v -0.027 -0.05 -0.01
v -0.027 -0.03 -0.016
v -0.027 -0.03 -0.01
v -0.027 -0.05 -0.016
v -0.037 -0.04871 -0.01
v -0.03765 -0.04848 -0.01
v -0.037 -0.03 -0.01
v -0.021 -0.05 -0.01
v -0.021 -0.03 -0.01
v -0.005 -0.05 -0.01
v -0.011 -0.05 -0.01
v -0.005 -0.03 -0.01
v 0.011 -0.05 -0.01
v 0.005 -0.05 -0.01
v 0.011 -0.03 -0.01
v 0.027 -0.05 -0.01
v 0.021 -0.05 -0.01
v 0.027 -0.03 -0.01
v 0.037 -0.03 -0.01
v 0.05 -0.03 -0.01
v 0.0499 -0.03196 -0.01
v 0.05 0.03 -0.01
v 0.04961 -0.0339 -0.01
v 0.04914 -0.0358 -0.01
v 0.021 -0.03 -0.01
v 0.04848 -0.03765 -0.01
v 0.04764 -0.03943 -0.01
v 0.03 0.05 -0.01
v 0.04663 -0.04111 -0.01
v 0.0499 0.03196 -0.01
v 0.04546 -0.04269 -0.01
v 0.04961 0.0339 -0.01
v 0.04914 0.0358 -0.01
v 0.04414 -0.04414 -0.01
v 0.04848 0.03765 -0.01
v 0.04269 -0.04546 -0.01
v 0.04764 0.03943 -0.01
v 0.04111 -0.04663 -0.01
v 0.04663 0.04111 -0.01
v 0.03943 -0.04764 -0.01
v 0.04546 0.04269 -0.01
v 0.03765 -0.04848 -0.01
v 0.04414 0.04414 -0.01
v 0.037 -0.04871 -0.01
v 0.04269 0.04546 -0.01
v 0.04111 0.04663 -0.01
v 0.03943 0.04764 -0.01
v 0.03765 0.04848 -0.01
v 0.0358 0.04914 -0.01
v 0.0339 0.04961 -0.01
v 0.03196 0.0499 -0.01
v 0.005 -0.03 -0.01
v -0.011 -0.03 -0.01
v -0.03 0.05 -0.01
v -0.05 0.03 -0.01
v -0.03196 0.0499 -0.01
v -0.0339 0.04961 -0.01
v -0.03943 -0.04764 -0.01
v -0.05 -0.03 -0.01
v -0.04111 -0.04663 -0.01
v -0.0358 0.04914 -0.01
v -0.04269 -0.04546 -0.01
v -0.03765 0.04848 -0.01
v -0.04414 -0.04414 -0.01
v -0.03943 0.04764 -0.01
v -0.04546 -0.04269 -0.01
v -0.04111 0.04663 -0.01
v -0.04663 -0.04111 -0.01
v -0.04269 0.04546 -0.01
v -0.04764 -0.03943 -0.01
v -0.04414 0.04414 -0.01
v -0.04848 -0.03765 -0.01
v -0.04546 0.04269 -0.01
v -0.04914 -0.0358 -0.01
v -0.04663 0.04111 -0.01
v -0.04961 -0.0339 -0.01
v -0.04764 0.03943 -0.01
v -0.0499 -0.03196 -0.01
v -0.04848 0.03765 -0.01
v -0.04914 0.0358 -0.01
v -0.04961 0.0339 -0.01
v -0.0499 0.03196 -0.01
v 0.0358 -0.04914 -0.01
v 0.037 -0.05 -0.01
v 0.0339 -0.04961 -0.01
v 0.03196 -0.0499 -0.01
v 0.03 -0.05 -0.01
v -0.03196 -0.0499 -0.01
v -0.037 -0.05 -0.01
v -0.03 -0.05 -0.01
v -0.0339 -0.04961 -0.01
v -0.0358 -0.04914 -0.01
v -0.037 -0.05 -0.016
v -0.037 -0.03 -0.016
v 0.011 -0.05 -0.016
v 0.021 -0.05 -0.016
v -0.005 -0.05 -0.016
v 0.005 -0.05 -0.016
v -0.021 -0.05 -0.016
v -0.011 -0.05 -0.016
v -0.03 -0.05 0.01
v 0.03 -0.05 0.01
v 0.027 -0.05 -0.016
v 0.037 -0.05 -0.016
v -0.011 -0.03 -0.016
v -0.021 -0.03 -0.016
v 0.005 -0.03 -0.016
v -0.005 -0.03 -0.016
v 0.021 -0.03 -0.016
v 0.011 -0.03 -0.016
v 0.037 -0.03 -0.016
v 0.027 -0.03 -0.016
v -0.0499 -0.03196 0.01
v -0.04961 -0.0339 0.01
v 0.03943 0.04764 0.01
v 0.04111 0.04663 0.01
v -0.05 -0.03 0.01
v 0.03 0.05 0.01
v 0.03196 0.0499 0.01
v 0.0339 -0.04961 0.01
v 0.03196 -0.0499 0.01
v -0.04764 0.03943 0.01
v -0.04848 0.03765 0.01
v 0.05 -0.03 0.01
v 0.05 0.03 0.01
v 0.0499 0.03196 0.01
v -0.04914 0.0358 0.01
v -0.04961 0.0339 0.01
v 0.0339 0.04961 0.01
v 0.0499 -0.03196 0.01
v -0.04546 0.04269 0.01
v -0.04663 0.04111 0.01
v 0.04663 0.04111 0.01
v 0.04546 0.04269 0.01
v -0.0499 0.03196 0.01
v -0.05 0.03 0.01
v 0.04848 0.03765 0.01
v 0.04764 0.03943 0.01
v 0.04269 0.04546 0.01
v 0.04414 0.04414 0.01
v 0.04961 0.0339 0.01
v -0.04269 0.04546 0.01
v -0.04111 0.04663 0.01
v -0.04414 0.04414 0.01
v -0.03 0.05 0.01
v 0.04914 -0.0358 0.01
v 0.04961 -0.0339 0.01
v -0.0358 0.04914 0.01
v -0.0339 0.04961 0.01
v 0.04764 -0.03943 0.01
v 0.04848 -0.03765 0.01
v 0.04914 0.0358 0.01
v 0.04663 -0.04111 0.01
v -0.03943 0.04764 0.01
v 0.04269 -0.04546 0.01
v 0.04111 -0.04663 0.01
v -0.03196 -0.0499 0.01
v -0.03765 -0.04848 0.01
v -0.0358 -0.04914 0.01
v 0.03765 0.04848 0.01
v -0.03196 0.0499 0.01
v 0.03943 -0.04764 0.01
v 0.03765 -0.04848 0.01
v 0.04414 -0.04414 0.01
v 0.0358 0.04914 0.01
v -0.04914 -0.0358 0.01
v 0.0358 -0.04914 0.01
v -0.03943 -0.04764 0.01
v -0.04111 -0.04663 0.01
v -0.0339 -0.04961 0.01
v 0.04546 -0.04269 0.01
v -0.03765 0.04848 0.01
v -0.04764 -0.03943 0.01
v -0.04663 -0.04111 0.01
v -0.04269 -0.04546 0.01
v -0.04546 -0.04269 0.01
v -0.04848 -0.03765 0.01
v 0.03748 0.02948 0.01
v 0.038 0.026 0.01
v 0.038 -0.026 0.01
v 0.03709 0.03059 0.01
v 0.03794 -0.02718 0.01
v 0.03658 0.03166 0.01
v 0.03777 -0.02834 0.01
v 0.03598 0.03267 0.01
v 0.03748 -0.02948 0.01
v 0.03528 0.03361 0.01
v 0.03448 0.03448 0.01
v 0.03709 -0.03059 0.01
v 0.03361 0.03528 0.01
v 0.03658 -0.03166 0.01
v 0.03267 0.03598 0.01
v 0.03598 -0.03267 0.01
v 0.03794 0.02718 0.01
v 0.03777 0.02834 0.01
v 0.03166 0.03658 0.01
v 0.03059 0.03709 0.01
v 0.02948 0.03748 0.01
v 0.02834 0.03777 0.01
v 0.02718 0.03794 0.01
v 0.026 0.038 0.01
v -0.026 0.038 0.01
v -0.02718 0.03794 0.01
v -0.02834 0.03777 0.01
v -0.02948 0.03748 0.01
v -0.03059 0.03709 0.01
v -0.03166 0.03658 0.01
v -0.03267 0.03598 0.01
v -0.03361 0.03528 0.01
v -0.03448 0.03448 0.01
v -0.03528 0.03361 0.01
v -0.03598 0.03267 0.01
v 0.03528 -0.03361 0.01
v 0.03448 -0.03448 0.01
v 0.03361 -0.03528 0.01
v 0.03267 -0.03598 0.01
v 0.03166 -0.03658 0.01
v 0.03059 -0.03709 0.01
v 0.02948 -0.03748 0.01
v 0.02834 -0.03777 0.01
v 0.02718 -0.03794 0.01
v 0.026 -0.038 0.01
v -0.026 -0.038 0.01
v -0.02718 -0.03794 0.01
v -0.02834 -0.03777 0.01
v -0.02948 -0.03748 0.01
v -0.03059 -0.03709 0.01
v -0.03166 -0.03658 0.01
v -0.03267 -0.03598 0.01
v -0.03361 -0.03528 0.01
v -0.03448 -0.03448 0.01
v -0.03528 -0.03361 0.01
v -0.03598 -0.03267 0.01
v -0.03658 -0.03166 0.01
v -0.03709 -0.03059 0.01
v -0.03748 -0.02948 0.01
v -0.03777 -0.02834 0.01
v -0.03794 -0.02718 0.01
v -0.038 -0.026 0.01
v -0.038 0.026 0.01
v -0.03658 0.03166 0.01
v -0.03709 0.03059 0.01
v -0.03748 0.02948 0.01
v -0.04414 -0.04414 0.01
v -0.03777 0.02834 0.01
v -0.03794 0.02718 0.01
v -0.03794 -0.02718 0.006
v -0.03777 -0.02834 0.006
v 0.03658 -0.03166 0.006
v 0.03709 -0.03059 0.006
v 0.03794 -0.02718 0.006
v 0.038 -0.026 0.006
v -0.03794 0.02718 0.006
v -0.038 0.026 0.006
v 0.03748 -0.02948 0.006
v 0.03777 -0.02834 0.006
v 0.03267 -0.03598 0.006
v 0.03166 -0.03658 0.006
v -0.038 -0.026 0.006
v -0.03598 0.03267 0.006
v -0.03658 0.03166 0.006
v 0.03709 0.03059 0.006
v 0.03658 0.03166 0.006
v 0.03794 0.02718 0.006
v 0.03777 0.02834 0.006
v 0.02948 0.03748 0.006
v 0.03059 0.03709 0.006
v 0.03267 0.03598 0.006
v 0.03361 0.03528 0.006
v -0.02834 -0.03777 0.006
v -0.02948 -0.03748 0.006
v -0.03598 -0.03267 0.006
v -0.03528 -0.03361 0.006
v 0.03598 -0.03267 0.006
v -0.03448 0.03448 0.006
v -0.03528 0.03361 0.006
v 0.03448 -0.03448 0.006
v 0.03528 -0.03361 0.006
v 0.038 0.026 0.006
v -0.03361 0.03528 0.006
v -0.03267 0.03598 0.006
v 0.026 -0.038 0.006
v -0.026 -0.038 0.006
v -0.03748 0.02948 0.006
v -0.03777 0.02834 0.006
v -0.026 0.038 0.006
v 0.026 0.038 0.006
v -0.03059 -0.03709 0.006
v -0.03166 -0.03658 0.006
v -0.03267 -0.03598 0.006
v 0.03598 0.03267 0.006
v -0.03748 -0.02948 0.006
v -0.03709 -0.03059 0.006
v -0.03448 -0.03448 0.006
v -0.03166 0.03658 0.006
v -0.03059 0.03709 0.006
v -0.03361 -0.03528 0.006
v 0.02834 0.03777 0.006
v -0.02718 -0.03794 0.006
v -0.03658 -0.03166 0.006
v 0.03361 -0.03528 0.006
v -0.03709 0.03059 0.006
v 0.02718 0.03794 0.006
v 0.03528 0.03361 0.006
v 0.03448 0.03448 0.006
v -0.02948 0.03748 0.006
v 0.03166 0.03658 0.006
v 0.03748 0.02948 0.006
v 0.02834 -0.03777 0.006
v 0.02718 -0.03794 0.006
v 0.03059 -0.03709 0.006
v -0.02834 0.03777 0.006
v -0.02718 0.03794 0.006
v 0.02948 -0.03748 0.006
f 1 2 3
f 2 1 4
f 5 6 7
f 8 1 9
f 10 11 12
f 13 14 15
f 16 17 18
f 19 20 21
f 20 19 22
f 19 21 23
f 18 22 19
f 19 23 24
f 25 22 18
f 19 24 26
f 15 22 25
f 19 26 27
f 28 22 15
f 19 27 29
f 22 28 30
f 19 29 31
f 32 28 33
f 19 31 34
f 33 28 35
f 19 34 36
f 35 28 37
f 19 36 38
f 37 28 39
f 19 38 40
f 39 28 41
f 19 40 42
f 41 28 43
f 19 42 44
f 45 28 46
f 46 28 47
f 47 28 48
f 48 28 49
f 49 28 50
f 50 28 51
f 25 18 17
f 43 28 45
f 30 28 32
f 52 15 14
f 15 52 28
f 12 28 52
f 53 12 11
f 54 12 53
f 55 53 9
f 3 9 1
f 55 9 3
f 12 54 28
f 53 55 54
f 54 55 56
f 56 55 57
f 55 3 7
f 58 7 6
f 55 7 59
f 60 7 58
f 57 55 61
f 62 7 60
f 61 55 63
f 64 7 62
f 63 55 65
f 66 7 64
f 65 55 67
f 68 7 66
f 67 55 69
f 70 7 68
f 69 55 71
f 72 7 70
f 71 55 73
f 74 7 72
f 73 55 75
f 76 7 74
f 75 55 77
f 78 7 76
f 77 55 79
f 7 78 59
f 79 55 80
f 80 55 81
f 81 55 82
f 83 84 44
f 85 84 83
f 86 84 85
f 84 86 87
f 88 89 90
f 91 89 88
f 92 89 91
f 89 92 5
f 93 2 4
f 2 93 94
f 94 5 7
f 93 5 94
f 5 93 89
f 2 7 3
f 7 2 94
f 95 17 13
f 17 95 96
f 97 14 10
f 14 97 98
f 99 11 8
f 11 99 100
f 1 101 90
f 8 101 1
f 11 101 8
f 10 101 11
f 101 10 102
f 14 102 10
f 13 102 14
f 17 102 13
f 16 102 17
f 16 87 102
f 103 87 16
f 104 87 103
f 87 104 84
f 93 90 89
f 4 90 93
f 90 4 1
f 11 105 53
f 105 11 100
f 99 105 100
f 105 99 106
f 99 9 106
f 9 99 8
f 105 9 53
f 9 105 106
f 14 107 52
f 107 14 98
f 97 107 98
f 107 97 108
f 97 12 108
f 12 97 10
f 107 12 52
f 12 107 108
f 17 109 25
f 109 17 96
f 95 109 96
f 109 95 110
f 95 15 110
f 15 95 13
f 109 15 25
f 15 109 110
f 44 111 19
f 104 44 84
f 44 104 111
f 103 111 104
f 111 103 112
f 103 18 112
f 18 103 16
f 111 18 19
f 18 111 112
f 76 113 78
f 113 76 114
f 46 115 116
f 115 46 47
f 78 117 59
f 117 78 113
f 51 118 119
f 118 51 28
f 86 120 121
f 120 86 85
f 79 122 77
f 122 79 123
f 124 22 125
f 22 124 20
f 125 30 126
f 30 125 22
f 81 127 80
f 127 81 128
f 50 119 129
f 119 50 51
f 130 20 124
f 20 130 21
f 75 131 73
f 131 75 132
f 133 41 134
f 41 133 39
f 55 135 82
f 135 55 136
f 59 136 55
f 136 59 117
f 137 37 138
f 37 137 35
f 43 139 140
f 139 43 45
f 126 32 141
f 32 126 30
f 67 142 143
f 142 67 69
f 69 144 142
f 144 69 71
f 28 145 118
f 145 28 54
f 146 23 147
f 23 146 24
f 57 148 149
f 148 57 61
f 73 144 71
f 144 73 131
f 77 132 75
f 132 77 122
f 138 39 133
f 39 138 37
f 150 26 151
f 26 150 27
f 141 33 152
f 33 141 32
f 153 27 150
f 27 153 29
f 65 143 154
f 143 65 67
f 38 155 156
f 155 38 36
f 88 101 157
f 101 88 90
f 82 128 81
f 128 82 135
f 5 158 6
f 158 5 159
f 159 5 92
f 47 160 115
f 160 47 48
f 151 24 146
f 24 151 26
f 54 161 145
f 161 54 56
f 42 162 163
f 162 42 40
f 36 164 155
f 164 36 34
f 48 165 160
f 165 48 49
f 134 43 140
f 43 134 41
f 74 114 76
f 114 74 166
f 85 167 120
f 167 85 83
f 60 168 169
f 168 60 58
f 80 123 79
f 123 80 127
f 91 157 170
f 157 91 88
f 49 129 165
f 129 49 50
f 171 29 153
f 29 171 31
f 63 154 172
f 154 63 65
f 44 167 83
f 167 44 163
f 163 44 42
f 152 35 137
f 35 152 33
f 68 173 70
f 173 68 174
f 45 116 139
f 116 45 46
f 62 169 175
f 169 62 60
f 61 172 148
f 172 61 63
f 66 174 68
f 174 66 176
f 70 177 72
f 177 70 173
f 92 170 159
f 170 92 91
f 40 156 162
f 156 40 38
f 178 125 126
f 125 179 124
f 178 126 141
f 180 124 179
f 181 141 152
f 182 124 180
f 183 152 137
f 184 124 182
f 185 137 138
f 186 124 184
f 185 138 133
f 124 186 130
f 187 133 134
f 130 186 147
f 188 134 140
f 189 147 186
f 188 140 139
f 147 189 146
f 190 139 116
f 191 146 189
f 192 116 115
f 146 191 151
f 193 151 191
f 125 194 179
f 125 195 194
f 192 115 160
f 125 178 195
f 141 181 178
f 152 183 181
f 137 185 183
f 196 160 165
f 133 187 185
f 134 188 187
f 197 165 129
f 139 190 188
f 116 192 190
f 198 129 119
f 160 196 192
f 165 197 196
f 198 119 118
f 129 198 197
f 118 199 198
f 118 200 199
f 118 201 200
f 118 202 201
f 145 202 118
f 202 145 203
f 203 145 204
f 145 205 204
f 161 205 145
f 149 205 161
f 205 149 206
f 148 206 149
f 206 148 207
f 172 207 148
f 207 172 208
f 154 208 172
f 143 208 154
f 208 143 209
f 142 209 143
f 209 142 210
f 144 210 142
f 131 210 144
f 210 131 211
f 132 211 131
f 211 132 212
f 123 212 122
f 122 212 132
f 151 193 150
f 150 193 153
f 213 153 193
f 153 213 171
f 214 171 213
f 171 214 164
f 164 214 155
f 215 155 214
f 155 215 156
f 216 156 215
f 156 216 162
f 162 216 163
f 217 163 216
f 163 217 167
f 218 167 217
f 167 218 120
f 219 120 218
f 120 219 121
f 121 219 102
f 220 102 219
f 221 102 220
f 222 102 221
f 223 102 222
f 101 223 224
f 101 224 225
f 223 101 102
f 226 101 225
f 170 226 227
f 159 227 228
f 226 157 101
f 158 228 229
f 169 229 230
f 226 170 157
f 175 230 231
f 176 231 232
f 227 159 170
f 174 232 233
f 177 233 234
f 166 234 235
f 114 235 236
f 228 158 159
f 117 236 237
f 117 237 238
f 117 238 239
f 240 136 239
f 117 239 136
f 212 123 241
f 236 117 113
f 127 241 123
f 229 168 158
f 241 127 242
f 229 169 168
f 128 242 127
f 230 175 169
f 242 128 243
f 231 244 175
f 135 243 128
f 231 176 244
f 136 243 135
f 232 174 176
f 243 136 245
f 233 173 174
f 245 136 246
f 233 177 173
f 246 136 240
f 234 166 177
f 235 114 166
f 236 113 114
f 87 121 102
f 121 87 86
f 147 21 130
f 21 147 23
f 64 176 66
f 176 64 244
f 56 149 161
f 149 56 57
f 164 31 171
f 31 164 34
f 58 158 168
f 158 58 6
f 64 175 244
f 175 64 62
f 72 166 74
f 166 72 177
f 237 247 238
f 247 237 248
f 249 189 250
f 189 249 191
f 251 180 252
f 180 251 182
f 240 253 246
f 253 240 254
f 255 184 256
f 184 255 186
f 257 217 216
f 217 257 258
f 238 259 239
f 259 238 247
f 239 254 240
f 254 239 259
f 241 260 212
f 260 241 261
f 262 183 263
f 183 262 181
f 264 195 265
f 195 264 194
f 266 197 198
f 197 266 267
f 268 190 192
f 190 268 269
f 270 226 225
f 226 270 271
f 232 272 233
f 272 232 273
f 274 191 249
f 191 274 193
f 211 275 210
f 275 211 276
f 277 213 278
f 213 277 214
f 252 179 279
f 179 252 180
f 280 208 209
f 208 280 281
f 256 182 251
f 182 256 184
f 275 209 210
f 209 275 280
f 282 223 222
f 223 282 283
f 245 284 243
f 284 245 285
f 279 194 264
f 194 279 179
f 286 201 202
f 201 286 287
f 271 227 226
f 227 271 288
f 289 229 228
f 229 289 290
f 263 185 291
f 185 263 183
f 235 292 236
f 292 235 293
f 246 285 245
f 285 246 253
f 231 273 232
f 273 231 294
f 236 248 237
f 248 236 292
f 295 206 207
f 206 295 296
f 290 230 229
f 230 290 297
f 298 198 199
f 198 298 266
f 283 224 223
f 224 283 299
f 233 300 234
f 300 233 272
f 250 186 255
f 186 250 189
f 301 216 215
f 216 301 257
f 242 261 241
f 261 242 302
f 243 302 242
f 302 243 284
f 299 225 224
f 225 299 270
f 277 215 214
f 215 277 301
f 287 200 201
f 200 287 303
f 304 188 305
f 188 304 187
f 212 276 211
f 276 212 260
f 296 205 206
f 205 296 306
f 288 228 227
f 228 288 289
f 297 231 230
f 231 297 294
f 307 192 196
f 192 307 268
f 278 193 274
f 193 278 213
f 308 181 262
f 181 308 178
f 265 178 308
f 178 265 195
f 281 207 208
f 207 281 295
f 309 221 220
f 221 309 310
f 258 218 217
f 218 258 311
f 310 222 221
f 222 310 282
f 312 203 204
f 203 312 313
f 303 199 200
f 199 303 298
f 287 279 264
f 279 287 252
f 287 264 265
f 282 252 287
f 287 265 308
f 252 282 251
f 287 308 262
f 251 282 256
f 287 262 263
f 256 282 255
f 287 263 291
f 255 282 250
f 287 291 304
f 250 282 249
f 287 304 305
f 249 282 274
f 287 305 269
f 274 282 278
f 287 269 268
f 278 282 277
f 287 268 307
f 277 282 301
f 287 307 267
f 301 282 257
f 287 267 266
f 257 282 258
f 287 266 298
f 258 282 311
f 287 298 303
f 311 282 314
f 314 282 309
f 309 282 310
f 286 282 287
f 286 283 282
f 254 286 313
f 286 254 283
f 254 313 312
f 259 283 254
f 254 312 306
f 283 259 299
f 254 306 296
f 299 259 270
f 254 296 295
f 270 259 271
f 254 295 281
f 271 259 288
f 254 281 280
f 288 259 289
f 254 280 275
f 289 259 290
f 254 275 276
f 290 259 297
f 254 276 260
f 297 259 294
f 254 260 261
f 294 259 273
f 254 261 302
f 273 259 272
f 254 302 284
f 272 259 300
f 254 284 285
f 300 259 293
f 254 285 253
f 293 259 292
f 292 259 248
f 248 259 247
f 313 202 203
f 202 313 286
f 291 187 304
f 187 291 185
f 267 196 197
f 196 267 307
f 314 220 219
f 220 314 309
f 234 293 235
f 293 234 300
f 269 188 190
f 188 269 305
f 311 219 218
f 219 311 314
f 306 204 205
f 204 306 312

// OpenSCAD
$fn=64;

size_x = 0.1;
size_y = 0.1;
size_z = 0.02;

corner_r = 0.02;

recess_depth = 0.004;
recess_margin = 0.012;
recess_r = 0.012;

tab_count = 5;
tab_w = 0.010;
tab_d = 0.020;
tab_h = 0.006;
tab_gap = 0.006;

module rounded_rect_2d(w, h, r){
    r2 = min(r, min(w,h)/2);
    hull(){
        translate([ w/2 - r2,  h/2 - r2]) circle(r=r2);
        translate([-w/2 + r2,  h/2 - r2]) circle(r=r2);
        translate([ w/2 - r2, -h/2 + r2]) circle(r=r2);
        translate([-w/2 + r2, -h/2 + r2]) circle(r=r2);
    }
}

module rounded_block(w,h,z,r){
    linear_extrude(height=z, center=true)
        rounded_rect_2d(w,h,r);
}

module recessed_pattern(w,h,depth,margin,r){
    inner_w = max(0.001, w - 2*margin);
    inner_h = max(0.001, h - 2*margin);
    translate([0,0, size_z/2 - depth/2])
        linear_extrude(height=depth, center=true)
            rounded_rect_2d(inner_w, inner_h, r);
}

module cross_recess(w,h,depth,bar_w){
    translate([0,0, size_z/2 - depth/2])
        union(){
            cube([w*0.70, bar_w, depth], center=true);
            cube([bar_w, h*0.70, depth], center=true);
        }
}

module tabs_row(count, tab_w, tab_d, tab_h, gap){
    total_w = count*tab_w + (count-1)*gap;
    for(i=[0:count-1]){
        x = -total_w/2 + tab_w/2 + i*(tab_w+gap);
        translate([x, -size_y/2 + tab_d/2, -size_z/2 - tab_h/2])
            cube([tab_w, tab_d, tab_h], center=true);
    }
}

difference(){
    union(){
        rounded_block(size_x, size_y, size_z, corner_r);
        tabs_row(tab_count, tab_w, tab_d, tab_h, tab_gap);
    }
    union(){
        recessed_pattern(size_x, size_y, recess_depth, recess_margin, recess_r);
        cross_recess(size_x, size_y, recess_depth*0.9, bar_w=0.010);
    }
}
